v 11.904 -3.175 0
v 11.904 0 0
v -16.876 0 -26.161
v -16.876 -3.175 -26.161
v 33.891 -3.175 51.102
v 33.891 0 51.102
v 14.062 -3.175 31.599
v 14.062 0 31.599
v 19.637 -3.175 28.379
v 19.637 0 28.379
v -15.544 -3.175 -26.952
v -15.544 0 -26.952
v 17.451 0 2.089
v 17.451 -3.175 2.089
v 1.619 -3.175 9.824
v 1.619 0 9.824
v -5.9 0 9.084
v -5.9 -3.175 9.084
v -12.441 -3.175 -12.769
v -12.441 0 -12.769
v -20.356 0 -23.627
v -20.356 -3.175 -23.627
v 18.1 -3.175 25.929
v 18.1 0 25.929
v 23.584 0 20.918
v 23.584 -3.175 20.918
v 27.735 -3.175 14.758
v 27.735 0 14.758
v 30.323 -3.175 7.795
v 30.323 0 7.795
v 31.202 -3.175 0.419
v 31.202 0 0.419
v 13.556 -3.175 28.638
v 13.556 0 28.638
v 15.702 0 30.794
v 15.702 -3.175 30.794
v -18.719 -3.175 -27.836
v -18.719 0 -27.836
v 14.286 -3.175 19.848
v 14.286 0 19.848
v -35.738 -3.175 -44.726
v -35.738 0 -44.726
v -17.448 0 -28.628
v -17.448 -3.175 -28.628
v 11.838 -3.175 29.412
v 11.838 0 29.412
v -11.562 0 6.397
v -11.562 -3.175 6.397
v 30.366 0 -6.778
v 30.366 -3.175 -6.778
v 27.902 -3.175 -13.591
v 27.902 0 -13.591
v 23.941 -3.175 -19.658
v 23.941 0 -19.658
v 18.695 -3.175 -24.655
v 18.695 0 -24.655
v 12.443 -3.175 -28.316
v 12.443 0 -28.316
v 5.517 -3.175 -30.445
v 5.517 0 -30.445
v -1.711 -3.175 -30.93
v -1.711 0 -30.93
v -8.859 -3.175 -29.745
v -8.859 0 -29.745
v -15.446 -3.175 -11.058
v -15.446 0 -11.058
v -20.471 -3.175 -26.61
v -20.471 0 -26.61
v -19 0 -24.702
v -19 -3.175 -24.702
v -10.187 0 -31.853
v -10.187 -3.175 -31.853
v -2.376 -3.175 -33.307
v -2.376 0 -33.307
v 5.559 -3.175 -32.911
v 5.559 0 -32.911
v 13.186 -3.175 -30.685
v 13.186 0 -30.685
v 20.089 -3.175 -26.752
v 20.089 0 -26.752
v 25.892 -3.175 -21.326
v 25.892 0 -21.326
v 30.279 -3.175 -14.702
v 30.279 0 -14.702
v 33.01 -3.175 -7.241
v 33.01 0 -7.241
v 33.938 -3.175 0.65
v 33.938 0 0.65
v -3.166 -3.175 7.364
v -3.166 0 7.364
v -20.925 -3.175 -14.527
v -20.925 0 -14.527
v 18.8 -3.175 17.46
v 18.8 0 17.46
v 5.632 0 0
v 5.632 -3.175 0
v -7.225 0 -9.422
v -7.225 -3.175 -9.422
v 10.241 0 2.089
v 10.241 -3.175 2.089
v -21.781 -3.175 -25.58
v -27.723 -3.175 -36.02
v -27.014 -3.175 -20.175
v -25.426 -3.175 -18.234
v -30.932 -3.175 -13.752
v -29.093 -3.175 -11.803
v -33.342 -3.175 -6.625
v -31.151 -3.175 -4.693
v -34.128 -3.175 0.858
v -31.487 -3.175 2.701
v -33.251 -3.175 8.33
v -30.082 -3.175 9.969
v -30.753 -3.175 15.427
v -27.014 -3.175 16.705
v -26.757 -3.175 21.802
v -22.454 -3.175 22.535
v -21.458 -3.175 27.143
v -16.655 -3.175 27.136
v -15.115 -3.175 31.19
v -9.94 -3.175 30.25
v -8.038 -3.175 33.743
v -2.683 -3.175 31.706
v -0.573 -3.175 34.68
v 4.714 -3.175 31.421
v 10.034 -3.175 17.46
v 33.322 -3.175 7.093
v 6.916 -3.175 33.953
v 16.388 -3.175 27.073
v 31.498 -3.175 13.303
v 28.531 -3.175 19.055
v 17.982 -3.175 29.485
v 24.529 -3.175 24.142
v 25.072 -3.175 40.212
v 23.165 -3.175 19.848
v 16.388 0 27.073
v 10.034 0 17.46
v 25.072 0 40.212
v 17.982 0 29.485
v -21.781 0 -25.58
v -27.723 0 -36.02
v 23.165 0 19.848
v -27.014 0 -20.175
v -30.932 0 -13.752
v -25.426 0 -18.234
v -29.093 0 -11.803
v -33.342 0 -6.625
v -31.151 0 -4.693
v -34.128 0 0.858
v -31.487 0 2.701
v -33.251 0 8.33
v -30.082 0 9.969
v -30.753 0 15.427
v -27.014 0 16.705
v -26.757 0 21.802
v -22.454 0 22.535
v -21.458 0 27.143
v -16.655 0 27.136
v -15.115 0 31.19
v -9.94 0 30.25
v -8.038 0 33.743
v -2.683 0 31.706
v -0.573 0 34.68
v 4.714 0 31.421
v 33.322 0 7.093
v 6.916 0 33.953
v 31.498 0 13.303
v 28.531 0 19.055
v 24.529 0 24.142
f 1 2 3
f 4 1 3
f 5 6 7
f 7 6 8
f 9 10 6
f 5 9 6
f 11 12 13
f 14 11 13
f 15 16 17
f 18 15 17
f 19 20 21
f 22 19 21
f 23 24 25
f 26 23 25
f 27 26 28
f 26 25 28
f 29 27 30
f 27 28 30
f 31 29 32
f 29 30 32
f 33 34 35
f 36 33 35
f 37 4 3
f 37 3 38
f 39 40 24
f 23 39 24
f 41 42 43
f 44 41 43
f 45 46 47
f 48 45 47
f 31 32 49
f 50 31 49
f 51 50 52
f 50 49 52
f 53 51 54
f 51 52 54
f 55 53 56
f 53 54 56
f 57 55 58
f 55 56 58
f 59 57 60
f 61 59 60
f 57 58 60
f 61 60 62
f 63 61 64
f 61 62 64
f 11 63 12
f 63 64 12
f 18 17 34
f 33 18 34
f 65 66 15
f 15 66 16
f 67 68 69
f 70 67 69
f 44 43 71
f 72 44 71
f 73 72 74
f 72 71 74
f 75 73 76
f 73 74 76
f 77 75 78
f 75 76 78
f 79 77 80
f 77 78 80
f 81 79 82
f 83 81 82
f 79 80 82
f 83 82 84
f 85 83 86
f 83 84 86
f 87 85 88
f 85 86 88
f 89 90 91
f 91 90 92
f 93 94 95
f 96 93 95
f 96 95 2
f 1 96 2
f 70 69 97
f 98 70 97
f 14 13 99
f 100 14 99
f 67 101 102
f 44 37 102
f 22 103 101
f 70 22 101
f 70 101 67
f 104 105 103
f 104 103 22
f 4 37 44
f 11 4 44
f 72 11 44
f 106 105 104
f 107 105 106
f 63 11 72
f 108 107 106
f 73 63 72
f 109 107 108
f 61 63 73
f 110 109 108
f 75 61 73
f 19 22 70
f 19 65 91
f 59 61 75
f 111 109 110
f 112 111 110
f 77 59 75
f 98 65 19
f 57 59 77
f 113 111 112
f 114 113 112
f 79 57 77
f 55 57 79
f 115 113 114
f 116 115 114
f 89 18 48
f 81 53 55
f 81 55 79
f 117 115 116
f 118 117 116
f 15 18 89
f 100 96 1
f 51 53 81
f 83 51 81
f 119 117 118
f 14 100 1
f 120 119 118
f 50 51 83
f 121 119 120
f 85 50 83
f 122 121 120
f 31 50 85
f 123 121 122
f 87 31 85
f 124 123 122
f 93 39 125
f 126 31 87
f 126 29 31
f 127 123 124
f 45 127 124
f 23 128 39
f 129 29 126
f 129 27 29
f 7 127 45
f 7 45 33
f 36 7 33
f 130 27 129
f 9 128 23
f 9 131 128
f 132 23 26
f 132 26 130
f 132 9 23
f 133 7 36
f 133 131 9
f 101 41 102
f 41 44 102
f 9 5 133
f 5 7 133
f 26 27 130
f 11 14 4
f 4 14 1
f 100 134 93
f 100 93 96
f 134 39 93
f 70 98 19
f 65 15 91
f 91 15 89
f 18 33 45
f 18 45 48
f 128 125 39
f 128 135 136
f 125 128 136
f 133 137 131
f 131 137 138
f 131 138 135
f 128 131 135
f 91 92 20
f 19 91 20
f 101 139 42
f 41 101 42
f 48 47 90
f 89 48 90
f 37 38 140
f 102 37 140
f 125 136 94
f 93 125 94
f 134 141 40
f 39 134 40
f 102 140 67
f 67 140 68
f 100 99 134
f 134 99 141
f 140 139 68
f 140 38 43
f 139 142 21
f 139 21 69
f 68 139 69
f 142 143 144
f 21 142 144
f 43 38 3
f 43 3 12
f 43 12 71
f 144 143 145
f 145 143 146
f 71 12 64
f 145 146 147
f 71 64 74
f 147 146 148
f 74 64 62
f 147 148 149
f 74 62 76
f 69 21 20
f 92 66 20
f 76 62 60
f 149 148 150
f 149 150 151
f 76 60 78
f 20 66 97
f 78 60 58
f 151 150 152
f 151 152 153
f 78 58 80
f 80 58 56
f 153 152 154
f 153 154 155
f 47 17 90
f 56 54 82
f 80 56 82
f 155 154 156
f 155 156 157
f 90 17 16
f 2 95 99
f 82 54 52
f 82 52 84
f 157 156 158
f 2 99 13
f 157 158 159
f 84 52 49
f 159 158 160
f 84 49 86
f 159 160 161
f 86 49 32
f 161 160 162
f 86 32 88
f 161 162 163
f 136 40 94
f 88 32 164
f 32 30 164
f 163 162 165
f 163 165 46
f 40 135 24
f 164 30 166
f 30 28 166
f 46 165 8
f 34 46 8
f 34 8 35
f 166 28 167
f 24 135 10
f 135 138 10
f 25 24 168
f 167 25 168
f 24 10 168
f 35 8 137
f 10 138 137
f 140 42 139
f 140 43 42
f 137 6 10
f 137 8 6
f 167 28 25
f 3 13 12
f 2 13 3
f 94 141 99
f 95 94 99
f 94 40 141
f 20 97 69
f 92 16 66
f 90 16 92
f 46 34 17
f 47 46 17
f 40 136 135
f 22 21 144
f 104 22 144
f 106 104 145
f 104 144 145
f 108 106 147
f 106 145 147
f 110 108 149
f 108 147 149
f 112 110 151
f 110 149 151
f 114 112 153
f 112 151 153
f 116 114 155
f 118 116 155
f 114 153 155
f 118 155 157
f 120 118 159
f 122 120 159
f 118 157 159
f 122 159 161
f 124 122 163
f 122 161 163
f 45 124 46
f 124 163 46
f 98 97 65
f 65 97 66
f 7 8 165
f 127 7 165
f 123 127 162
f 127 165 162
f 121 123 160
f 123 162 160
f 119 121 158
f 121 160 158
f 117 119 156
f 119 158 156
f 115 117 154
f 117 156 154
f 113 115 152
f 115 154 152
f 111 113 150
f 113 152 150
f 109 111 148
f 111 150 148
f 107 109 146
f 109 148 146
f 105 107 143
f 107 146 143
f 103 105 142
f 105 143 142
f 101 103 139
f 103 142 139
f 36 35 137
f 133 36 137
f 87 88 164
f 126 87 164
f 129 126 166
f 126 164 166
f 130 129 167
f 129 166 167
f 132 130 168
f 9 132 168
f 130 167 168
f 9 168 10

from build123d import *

# Parameters (mm, degrees)
F1_DEPTH = 3.175


with BuildPart() as f1:
    # F0 (on Front) → F1 (new body)
    with BuildSketch(Plane.XZ):
        with BuildLine():
            ThreePointArc((18.1003854029, 25.9293170253), (27.7354169074, 14.7579941641), (31.2024073118, 0.4188078519))
            ThreePointArc((31.2024073118, 0.4188078519), (15.6747583451, -26.6663225741), (-15.5443153352, -26.9519992705))
            Line((-15.5443153352, -26.9519992705), (-17.4479872613, -28.6275453194))
            ThreePointArc((-17.4479872613, -28.6275453194), (16.7522947844, -28.9206845921), (33.9376170858, 0.6497384695))
            ThreePointArc((33.9376170858, 0.6497384695), (30.1518596131, 16.2494630696), (19.6368196433, 28.3786551975))
            Line((19.6368196433, 28.3786551975), (18.1003854029, 25.9293170253))
        make_face()
        with BuildLine():
            ThreePointArc((16.3881498341, 27.0734219148), (17.253653438, 26.5154160266), (18.1003854029, 25.9293170253))
            Line((18.1003854029, 25.9293170253), (19.6368196433, 28.3786551975))
            ThreePointArc((19.6368196433, 28.3786551975), (18.8174924383, 28.9438406682), (17.9819876939, 29.4848245007))
            Line((17.9819876939, 29.4848245007), (16.3881498341, 27.0734219148))
        make_face()
        with BuildLine():
            Line((-17.4479872613, -28.6275453194), (-15.5443153352, -26.9519992705))
            ThreePointArc((-15.5443153352, -26.9519992705), (-16.2151958858, -26.5645395925), (-16.8763088681, -26.1606394314))
            Line((-16.8763088681, -26.1606394314), (-18.7192165135, -27.8357967551))
            ThreePointArc((-18.7192165135, -27.8357967551), (-18.0879575097, -28.2386644121), (-17.4479872613, -28.6275453194))
        make_face()
        with BuildLine():
            ThreePointArc((17.9819876939, 29.4848245007), (18.8174924383, 28.9438406682), (19.6368196433, 28.3786551975))
            Line((19.6368196433, 28.3786551975), (33.8907018304, 51.1017739773))
            Line((33.8907018304, 51.1017739773), (14.0615815229, 31.5986632111))
            ThreePointArc((14.0615815229, 31.5986632111), (14.88706319, 31.2075763768), (15.7017518794, 30.7944768319))
            Line((15.7017518794, 30.7944768319), (25.0723678619, 40.2122400701))
            Line((25.0723678619, 40.2122400701), (17.9819876939, 29.4848245007))
        make_face()
        with BuildLine():
            Line((-35.7383415103, -44.7260811925), (-17.4479872613, -28.6275453194))
            ThreePointArc((-17.4479872613, -28.6275453194), (-18.0879575097, -28.2386644121), (-18.7192165135, -27.8357967551))
            Line((-18.7192165135, -27.8357967551), (-27.7228504419, -36.0198765993))
            Line((-27.7228504419, -36.0198765993), (-20.4711550552, -26.6101538588))
            ThreePointArc((-20.4711550552, -26.6101538588), (-21.1322326485, -26.1033010296), (-21.7807070785, -25.5804202701))
            Line((-21.7807070785, -25.5804202701), (-35.7383415103, -44.7260811925))
        make_face()
        with BuildLine():
            ThreePointArc((11.8378918102, 29.4115330659), (12.702739818, 29.0376137231), (13.5559743104, 28.6379030117))
            Line((13.5559743104, 28.6379030117), (15.7017518794, 30.7944768319))
            ThreePointArc((15.7017518794, 30.7944768319), (14.88706319, 31.2075763768), (14.0615815229, 31.5986632111))
            Line((14.0615815229, 31.5986632111), (11.8378918102, 29.4115330659))
        make_face()
        with BuildLine():
            Line((-20.4711550552, -26.6101538588), (-19.0004213571, -24.7017454678))
            ThreePointArc((-19.000421357, -24.7017454678), (-19.6857633723, -24.1734886316), (-20.3562825888, -23.6265398743))
            Line((-20.3562825888, -23.6265398743), (-21.7807070785, -25.5804202701))
            ThreePointArc((-21.7807070785, -25.5804202701), (-21.1322326485, -26.1033010296), (-20.4711550552, -26.6101538588))
        make_face()
        with BuildLine():
            ThreePointArc((-20.3562825888, -23.6265398743), (-27.0142720371, 16.7048556324), (11.8378918102, 29.4115330659))
            Line((11.8378918102, 29.4115330659), (14.0615815229, 31.5986632111))
            ThreePointArc((14.0615815229, 31.5986632111), (-28.9318907936, 18.7255261755), (-21.7807070785, -25.5804202701))
            Line((-21.7807070785, -25.5804202701), (-20.3562825888, -23.6265398743))
        make_face()
        with BuildLine():
            Line((-5.9004323557, 9.0836035088), (13.5559743104, 28.6379030117))
            ThreePointArc((13.5559743104, 28.6379030117), (12.702739818, 29.0376137231), (11.8378918102, 29.4115330659))
            Line((11.8378918102, 29.4115330659), (-11.5615911782, 6.3967597671))
            Line((-11.5615911782, 6.3967597671), (-3.1656639185, 7.3638306931))
            Line((-3.1656639185, 7.3638306931), (-20.9245868027, -14.5271206275))
            Line((-20.9245868027, -14.5271206275), (-12.4407447875, -12.7688115463))
            Line((-12.4407447875, -12.7688115463), (-20.3562825888, -23.6265398743))
            ThreePointArc((-20.3562825888, -23.6265398743), (-19.6857633723, -24.1734886316), (-19.000421357, -24.7017454678))
            Line((-19.0004213571, -24.7017454678), (-7.2250561789, -9.4221569598))
            Line((-7.2250561789, -9.4221569598), (-15.4455099255, -11.0584562644))
            Line((-15.4455099255, -11.0584562644), (1.6187507426, 9.8238335922))
            Line((1.6187507426, 9.8238335922), (-5.9004323557, 9.0836035088))
        make_face()
        with BuildLine():
            Line((14.2855551094, 19.8478270322), (18.1003854029, 25.9293170253))
            ThreePointArc((18.1003854029, 25.9293170253), (17.253653438, 26.5154160266), (16.3881498341, 27.0734219148))
            Line((16.3881498341, 27.0734219148), (10.034003295, 17.4598935992))
            Line((10.034003295, 17.4598935992), (18.7998898327, 17.4598935992))
            Line((18.7998898327, 17.4598935992), (5.6315795518, 0))
            Line((5.6315795518, 0), (11.9040580466, 0))
            Line((11.9040580466, 0), (-16.8763088681, -26.1606394314))
            ThreePointArc((-16.8763088681, -26.1606394314), (-16.2151958858, -26.5645395925), (-15.5443153352, -26.9519992705))
            Line((-15.5443153352, -26.9519992705), (17.4505114555, 2.0889036823))
            Line((17.4505114555, 2.0889036823), (10.2414432913, 2.0889036823))
            Line((10.2414432913, 2.0889036823), (23.1650173664, 19.8478270322))
            Line((23.1650173664, 19.8478270322), (14.2855551094, 19.8478270322))
        make_face()
    extrude(amount=F1_DEPTH)


solid = f1.part
